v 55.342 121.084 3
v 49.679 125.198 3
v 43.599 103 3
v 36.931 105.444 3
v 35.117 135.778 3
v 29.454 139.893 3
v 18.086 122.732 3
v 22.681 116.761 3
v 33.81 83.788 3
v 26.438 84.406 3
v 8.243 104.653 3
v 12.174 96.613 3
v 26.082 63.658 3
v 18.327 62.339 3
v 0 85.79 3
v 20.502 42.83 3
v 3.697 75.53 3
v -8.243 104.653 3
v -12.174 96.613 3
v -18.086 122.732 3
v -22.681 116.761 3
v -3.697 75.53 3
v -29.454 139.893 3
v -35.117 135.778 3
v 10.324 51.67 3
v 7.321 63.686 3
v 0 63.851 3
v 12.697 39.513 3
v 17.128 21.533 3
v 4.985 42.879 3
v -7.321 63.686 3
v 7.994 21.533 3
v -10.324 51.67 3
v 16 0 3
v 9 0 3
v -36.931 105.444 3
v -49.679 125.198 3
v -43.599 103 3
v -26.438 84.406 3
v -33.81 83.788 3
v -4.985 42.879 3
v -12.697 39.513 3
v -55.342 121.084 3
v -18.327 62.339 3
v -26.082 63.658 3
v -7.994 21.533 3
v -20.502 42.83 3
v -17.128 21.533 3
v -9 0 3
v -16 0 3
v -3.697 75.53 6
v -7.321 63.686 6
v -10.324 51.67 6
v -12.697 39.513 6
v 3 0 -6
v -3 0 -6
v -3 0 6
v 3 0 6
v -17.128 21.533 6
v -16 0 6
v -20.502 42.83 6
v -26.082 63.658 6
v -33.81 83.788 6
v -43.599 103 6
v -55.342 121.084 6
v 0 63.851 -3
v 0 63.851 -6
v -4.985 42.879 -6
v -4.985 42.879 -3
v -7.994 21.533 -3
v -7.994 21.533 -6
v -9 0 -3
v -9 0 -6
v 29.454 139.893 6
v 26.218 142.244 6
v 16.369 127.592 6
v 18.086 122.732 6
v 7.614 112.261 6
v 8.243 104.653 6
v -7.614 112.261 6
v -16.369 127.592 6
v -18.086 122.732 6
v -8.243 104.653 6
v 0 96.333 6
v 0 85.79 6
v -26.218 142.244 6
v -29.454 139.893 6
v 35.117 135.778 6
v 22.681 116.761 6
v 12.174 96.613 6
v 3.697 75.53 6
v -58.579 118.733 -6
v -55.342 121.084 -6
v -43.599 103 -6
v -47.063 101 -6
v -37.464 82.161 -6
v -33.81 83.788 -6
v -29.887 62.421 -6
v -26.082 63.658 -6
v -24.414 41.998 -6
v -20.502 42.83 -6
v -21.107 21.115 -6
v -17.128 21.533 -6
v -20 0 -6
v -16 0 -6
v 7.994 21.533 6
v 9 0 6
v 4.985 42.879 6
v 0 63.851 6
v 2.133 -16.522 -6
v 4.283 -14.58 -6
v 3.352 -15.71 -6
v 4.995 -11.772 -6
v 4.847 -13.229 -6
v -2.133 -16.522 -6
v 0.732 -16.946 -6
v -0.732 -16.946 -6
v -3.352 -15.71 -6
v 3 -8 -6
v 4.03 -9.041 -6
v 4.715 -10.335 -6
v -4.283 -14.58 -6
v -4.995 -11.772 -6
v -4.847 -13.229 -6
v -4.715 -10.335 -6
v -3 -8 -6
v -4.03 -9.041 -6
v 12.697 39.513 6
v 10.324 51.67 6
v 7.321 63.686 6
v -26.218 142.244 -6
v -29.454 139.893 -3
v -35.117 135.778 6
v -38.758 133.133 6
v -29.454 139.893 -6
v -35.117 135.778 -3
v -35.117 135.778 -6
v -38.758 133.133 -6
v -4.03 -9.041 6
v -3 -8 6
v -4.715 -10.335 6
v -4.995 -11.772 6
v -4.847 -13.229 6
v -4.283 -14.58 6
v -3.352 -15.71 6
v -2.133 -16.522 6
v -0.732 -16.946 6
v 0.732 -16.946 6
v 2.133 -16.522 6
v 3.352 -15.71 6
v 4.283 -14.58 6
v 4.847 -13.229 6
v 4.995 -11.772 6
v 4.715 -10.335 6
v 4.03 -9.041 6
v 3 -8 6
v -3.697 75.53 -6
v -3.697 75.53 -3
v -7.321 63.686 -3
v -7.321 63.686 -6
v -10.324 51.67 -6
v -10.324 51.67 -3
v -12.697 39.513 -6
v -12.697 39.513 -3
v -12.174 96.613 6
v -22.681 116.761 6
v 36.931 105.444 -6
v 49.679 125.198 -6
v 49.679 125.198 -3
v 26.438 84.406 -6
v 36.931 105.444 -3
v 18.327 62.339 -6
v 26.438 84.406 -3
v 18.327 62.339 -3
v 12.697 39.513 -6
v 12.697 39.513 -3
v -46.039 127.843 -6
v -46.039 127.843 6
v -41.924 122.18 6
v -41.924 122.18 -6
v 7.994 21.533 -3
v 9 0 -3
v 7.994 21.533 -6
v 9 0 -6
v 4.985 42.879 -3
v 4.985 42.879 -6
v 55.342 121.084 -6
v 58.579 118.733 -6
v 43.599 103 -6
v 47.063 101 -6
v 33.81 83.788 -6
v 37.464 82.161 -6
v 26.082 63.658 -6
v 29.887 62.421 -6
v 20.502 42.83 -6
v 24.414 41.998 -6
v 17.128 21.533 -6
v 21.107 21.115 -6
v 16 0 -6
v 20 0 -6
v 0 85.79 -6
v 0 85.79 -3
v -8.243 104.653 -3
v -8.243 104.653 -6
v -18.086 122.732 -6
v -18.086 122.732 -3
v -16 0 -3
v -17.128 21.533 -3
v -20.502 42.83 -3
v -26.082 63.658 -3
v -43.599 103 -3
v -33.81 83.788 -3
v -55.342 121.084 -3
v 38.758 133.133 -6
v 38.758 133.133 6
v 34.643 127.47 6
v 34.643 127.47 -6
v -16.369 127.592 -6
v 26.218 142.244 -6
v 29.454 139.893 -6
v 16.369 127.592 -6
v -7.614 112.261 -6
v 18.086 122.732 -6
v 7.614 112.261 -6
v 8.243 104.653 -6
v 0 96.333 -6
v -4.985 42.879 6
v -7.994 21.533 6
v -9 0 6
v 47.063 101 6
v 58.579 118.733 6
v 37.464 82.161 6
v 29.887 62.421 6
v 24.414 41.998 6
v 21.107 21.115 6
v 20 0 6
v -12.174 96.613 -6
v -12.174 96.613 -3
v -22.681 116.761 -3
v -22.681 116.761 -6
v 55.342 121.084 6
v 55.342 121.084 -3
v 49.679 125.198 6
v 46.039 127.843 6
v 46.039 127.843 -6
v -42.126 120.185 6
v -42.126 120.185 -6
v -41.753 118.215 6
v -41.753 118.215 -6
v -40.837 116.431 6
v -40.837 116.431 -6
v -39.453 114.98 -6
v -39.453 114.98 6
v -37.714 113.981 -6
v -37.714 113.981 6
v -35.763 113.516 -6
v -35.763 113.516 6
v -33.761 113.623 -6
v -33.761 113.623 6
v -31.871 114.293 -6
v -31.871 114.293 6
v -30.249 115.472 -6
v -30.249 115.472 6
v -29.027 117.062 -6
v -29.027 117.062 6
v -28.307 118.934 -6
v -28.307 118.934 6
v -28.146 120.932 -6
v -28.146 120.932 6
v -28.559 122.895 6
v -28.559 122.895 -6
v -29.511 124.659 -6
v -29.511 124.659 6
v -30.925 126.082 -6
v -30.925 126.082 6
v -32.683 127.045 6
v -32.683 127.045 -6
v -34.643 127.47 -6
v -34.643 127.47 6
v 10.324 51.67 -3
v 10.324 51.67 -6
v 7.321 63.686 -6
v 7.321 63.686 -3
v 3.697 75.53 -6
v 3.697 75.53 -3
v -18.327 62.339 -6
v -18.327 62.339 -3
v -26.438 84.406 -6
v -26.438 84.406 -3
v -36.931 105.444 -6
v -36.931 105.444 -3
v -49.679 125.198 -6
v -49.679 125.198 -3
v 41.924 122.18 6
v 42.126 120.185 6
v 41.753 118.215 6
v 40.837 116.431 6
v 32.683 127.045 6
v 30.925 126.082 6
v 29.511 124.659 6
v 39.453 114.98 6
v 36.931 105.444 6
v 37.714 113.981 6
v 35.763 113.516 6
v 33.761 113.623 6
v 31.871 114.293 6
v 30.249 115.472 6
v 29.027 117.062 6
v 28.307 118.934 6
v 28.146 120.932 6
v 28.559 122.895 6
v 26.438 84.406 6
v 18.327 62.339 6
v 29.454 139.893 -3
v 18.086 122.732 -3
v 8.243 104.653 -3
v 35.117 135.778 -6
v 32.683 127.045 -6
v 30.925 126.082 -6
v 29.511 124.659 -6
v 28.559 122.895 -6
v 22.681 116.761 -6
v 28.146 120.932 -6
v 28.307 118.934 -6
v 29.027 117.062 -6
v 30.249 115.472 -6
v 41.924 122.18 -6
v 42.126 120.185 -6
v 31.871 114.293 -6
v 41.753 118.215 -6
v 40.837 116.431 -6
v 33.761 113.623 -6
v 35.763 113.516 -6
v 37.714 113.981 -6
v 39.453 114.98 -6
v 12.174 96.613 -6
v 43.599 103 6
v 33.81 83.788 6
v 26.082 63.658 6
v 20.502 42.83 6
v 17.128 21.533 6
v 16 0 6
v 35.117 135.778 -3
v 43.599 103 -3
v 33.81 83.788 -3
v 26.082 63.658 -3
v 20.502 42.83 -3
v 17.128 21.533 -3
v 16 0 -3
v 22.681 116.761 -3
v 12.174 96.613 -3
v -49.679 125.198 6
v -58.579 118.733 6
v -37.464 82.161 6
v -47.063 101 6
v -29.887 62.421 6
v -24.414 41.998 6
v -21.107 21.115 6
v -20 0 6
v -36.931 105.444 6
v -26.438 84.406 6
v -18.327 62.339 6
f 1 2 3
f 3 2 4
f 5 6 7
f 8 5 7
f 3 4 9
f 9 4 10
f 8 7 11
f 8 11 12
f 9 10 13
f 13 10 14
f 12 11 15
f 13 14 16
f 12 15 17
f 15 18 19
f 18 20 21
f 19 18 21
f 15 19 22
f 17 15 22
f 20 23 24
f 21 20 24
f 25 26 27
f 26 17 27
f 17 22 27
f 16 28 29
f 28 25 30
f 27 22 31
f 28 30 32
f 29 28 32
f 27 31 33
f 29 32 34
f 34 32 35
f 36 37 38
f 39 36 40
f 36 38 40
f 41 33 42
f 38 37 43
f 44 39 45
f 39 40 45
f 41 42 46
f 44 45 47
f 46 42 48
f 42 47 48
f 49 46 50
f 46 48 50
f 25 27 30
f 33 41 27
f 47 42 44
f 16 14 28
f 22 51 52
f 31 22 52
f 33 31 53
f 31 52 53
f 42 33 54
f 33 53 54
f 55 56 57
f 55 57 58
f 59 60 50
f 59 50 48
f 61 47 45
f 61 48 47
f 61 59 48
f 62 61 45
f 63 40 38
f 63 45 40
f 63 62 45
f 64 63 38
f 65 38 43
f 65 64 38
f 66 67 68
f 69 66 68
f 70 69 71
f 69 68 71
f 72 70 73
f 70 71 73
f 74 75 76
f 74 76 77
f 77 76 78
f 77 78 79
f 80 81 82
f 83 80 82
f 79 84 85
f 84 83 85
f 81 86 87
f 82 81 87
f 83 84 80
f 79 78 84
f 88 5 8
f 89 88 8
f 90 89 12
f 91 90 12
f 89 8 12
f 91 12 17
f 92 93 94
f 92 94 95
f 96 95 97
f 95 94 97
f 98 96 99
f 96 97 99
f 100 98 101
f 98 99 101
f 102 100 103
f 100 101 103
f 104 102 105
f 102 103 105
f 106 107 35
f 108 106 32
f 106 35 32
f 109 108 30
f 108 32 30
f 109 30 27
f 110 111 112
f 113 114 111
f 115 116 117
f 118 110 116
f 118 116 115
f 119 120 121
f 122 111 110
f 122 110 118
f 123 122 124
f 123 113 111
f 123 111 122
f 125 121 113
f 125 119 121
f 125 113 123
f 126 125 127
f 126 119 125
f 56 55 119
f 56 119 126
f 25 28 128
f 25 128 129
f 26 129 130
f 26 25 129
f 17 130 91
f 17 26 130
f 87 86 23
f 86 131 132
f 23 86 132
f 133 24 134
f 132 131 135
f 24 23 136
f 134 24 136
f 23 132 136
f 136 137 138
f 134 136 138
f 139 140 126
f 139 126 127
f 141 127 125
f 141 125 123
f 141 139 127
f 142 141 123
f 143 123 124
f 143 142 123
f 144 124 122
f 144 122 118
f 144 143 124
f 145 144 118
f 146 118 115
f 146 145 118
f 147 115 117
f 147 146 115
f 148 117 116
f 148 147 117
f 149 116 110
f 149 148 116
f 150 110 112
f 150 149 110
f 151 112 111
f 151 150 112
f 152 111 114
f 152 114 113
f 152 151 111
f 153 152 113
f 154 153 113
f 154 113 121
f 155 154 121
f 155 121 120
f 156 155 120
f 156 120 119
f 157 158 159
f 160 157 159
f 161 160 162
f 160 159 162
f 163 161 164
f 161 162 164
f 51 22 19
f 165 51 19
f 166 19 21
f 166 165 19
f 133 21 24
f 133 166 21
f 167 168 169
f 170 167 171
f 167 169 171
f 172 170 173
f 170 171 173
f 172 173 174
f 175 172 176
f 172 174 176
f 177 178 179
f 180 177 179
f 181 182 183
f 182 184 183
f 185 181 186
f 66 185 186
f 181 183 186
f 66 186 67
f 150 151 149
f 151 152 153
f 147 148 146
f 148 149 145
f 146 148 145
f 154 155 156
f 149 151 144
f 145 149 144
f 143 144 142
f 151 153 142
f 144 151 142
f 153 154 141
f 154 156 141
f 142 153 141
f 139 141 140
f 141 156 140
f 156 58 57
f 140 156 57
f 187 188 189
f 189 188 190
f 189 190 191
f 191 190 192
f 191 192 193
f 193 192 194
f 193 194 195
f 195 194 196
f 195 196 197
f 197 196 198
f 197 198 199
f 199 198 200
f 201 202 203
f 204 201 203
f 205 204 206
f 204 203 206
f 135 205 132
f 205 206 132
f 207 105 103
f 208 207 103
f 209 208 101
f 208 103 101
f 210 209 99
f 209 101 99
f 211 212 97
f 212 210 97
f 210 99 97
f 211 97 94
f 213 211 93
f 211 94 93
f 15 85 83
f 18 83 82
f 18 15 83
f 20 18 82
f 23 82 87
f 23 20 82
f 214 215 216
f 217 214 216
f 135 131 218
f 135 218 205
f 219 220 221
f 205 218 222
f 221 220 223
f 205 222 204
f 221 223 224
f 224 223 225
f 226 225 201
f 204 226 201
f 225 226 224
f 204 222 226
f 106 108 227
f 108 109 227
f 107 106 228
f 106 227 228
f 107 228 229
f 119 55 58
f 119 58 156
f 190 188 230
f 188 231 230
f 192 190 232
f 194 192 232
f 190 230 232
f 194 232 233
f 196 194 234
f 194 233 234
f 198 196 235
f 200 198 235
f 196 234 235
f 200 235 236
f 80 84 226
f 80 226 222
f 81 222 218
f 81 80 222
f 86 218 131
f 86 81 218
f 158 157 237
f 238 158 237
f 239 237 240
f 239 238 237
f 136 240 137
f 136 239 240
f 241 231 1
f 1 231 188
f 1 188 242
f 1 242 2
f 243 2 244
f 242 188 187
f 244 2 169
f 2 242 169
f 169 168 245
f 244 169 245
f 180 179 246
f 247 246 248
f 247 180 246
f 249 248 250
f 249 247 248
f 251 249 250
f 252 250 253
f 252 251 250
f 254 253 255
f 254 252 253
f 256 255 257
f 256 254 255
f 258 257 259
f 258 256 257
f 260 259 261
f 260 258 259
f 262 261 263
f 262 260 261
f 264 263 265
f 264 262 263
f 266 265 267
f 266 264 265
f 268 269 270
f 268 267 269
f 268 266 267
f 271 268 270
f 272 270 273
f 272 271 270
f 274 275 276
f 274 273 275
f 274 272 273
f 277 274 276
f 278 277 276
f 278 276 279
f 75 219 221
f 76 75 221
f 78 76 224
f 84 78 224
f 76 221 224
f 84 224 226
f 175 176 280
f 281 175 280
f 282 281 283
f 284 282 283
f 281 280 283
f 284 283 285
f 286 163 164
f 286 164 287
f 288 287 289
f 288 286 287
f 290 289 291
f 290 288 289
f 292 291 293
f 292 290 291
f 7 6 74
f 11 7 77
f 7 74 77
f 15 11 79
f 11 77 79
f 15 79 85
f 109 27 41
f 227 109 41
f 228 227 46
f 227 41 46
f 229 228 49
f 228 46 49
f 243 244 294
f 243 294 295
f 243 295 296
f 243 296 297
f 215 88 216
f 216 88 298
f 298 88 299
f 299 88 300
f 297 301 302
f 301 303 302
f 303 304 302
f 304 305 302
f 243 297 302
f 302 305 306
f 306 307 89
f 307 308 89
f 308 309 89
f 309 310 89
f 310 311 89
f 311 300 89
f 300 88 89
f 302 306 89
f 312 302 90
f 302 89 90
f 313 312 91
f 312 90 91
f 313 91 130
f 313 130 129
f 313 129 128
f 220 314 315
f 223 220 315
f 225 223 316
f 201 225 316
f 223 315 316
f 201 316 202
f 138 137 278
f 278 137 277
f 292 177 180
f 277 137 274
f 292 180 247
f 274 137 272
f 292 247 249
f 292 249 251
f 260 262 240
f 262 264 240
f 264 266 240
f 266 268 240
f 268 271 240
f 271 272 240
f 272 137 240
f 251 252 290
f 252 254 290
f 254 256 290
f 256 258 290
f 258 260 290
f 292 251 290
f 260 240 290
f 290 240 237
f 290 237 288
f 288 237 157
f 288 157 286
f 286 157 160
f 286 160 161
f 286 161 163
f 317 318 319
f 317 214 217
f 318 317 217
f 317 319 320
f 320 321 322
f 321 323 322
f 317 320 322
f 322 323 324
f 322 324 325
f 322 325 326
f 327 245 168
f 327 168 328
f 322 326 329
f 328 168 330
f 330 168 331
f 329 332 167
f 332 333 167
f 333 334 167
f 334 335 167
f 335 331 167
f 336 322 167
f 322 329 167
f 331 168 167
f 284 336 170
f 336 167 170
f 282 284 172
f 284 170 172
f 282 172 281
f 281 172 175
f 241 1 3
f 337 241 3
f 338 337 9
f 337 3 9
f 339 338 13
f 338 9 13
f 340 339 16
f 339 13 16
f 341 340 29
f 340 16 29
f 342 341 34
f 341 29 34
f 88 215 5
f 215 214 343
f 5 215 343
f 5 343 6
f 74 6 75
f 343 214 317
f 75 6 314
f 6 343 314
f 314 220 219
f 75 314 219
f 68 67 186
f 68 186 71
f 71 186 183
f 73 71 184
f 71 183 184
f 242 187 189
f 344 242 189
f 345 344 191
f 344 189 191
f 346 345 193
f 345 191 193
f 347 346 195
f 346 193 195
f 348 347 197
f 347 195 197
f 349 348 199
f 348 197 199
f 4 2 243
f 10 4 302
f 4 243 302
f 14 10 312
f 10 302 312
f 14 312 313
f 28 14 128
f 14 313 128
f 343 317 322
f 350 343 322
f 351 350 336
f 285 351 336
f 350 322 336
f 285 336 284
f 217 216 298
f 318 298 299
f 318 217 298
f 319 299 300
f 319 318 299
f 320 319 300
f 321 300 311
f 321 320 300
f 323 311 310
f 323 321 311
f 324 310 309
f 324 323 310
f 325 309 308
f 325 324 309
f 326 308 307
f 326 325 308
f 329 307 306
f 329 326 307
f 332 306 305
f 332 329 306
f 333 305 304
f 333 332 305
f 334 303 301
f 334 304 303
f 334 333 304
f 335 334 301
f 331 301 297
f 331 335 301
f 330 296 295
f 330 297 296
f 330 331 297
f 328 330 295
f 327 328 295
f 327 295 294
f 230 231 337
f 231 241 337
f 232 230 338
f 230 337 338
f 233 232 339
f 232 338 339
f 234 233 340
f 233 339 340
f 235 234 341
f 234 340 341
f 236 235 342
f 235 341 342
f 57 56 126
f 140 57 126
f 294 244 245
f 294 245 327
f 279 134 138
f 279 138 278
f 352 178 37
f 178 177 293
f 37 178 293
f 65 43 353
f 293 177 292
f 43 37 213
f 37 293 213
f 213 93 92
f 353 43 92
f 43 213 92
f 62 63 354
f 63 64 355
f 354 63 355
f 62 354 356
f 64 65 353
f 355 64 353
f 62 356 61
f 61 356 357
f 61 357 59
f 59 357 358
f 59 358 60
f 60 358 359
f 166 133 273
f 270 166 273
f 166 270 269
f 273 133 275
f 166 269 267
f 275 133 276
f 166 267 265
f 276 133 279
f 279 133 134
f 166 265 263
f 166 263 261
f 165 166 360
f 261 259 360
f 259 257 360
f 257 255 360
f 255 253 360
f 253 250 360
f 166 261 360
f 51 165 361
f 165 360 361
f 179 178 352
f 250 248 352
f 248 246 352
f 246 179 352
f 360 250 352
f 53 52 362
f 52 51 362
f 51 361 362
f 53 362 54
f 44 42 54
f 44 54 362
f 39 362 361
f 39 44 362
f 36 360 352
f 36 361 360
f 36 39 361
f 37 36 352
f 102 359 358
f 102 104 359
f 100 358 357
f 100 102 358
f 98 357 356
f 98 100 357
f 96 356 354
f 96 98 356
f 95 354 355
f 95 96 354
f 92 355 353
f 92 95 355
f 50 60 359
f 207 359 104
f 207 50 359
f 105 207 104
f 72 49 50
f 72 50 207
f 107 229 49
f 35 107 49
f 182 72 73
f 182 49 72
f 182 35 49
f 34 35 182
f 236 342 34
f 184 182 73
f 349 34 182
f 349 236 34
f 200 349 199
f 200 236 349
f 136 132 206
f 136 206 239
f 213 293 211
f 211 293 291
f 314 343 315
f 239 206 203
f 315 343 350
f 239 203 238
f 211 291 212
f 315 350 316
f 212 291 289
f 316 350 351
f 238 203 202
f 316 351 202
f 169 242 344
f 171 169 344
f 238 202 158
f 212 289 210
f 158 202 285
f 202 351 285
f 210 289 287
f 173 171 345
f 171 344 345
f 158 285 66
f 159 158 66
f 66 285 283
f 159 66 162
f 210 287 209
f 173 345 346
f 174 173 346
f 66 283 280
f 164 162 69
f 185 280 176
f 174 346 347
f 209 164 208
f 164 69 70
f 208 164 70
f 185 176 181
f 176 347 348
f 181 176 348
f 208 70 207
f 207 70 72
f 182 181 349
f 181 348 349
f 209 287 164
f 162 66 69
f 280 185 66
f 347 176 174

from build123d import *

# Parameters (mm, degrees)
SKETCH003_W          = 7
SKETCH003_H          = 3
SKETCH004_W          = 7
SKETCH004_H          = 3
SKETCH005_W          = 7
SKETCH005_H          = 3
SKETCH006_W          = 7
SKETCH006_H          = 3
POCKET_DEPTH         = 6.001
POCKET_DEPTH_BACK    = -6.001
POCKET001_DEPTH      = 6.001
POCKET001_DEPTH_BACK = -6.001
PAD_DEPTH            = 6


with BuildPart() as main:
    # AdditivePipe: sweep along a path in Sketch
    with BuildLine(Plane.XY) as additivepipe_path:
        ThreePointArc((0, 0), (-10.865453, 68.601773), (-42.398227, 130.488326))
    # Sketch002 → AdditivePipe (sweep)
    with BuildSketch(Plane.XZ):
        Polygon((-20, 6), (-20, -6), (-16, -6), (-16, -3), (-9, -3), (-9, -6), (9, -6), (9, -3), (16, -3), (16, -6), (20, -6), (20, 6), (16, 6), (16, 3), (9, 3), (9, 6), (-9, 6), (-9, 3), (-16, 3), (-16, 6), align=None)
    sweep(path=additivepipe_path.line)

    # AdditivePipe001: sweep along a path in Sketch001
    with BuildLine(Plane.XY) as additivepipe001_path:
        ThreePointArc((42.398227, 130.488326), (10.865453, 68.601773), (0, 0))
    # Sketch002 → AdditivePipe001 (sweep)
    with BuildSketch(Plane.XZ):
        Polygon((-20, 6), (-20, -6), (-16, -6), (-16, -3), (-9, -3), (-9, -6), (9, -6), (9, -3), (16, -3), (16, -6), (20, -6), (20, 6), (16, 6), (16, 3), (9, 3), (9, 6), (-9, 6), (-9, 3), (-16, 3), (-16, 6), align=None)
    sweep(path=additivepipe001_path.line)

    # SubtractivePipe: sweep along a path in Sketch
    with BuildLine(Plane.XY) as subtractivepipe_path:
        ThreePointArc((0, 0), (-10.865453, 68.601773), (-42.398227, 130.488326))
    # Sketch003 → SubtractivePipe (sweep, cut)
    with BuildSketch(Plane.XZ):
        with Locations((-12.5, 4.5)):
            Rectangle(SKETCH003_W, SKETCH003_H)
    sweep(path=subtractivepipe_path.line, mode=Mode.SUBTRACT)

    # SubtractivePipe001: sweep along a path in Sketch001
    with BuildLine(Plane.XY) as subtractivepipe001_path:
        ThreePointArc((42.398227, 130.488326), (10.865453, 68.601773), (0, 0))
    # Sketch003 → SubtractivePipe001 (sweep, cut)
    with BuildSketch(Plane.XZ):
        with Locations((-12.5, 4.5)):
            Rectangle(SKETCH003_W, SKETCH003_H)
    sweep(path=subtractivepipe001_path.line, mode=Mode.SUBTRACT)

    # SubtractivePipe002: sweep along a path in Sketch
    with BuildLine(Plane.XY) as subtractivepipe002_path:
        ThreePointArc((0, 0), (-10.865453, 68.601773), (-42.398227, 130.488326))
    # Sketch004 → SubtractivePipe002 (sweep, cut)
    with BuildSketch(Plane.XZ):
        with Locations((12.5, 4.5)):
            Rectangle(SKETCH004_W, SKETCH004_H)
    sweep(path=subtractivepipe002_path.line, mode=Mode.SUBTRACT)

    # SubtractivePipe003: sweep along a path in Sketch001
    with BuildLine(Plane.XY) as subtractivepipe003_path:
        ThreePointArc((42.398227, 130.488326), (10.865453, 68.601773), (0, 0))
    # Sketch004 → SubtractivePipe003 (sweep, cut)
    with BuildSketch(Plane.XZ):
        with Locations((12.5, 4.5)):
            Rectangle(SKETCH004_W, SKETCH004_H)
    sweep(path=subtractivepipe003_path.line, mode=Mode.SUBTRACT)

    # SubtractivePipe004: sweep along a path in Sketch
    with BuildLine(Plane.XY) as subtractivepipe004_path:
        ThreePointArc((0, 0), (-10.865453, 68.601773), (-42.398227, 130.488326))
    # Sketch005 → SubtractivePipe004 (sweep, cut)
    with BuildSketch(Plane.XZ):
        with Locations((-12.5, -4.5)):
            Rectangle(SKETCH005_W, SKETCH005_H)
    sweep(path=subtractivepipe004_path.line, mode=Mode.SUBTRACT)

    # SubtractivePipe005: sweep along a path in Sketch001
    with BuildLine(Plane.XY) as subtractivepipe005_path:
        ThreePointArc((42.398227, 130.488326), (10.865453, 68.601773), (0, 0))
    # Sketch005 → SubtractivePipe005 (sweep, cut)
    with BuildSketch(Plane.XZ):
        with Locations((-12.5, -4.5)):
            Rectangle(SKETCH005_W, SKETCH005_H)
    sweep(path=subtractivepipe005_path.line, mode=Mode.SUBTRACT)

    # SubtractivePipe006: sweep along a path in Sketch
    with BuildLine(Plane.XY) as subtractivepipe006_path:
        ThreePointArc((0, 0), (-10.865453, 68.601773), (-42.398227, 130.488326))
    # Sketch006 → SubtractivePipe006 (sweep, cut)
    with BuildSketch(Plane.XZ):
        with Locations((12.5, -4.5)):
            Rectangle(SKETCH006_W, SKETCH006_H)
    sweep(path=subtractivepipe006_path.line, mode=Mode.SUBTRACT)

    # SubtractivePipe007: sweep along a path in Sketch001
    with BuildLine(Plane.XY) as subtractivepipe007_path:
        ThreePointArc((42.398227, 130.488326), (10.865453, 68.601773), (0, 0))
    # Sketch006 → SubtractivePipe007 (sweep, cut)
    with BuildSketch(Plane.XZ):
        with Locations((12.5, -4.5)):
            Rectangle(SKETCH006_W, SKETCH006_H)
    sweep(path=subtractivepipe007_path.line, mode=Mode.SUBTRACT)

    # Sketch008 → Pocket (cut, two sides)
    with BuildSketch(Plane.XY) as pocket_sk:
        with BuildLine():
            Line((-46.038804, 127.843292), (-38.757651, 133.13336))
            Line((-38.757651, 133.13336), (-34.643154, 127.470241))
            ThreePointArc((-41.924307, 122.180173), (-31.017586, 114.824218), (-34.643154, 127.470241))
            Line((-46.038804, 127.843292), (-41.924307, 122.180173))
        make_face()
    extrude(amount=-POCKET_DEPTH, mode=Mode.SUBTRACT)
    extrude(pocket_sk.sketch, amount=-POCKET_DEPTH_BACK, mode=Mode.SUBTRACT)

    # Sketch009 → Pocket001 (cut, two sides)
    with BuildSketch(Plane.XY) as pocket001_sk:
        with BuildLine():
            Line((38.757651, 133.13336), (46.038804, 127.843292))
            Line((46.038804, 127.843292), (41.924307, 122.180173))
            ThreePointArc((34.643154, 127.470241), (31.017586, 114.824218), (41.924307, 122.180173))
            Line((38.757651, 133.13336), (34.643154, 127.470241))
        make_face()
    extrude(amount=-POCKET001_DEPTH, mode=Mode.SUBTRACT)
    extrude(pocket001_sk.sketch, amount=-POCKET001_DEPTH_BACK, mode=Mode.SUBTRACT)


with BuildPart() as male1:
    # Sketch010 → Pad (new body, symmetric)
    with BuildSketch(Plane.XY):
        with BuildLine():
            Line((-3, 0), (3, 0))
            Line((3, 0), (3, -8))
            ThreePointArc((-3, -8), (0, -17), (3, -8))
            Line((-3, 0), (-3, -8))
        make_face()
    extrude(amount=PAD_DEPTH, both=True)


solid = Compound([main.part, male1.part])
